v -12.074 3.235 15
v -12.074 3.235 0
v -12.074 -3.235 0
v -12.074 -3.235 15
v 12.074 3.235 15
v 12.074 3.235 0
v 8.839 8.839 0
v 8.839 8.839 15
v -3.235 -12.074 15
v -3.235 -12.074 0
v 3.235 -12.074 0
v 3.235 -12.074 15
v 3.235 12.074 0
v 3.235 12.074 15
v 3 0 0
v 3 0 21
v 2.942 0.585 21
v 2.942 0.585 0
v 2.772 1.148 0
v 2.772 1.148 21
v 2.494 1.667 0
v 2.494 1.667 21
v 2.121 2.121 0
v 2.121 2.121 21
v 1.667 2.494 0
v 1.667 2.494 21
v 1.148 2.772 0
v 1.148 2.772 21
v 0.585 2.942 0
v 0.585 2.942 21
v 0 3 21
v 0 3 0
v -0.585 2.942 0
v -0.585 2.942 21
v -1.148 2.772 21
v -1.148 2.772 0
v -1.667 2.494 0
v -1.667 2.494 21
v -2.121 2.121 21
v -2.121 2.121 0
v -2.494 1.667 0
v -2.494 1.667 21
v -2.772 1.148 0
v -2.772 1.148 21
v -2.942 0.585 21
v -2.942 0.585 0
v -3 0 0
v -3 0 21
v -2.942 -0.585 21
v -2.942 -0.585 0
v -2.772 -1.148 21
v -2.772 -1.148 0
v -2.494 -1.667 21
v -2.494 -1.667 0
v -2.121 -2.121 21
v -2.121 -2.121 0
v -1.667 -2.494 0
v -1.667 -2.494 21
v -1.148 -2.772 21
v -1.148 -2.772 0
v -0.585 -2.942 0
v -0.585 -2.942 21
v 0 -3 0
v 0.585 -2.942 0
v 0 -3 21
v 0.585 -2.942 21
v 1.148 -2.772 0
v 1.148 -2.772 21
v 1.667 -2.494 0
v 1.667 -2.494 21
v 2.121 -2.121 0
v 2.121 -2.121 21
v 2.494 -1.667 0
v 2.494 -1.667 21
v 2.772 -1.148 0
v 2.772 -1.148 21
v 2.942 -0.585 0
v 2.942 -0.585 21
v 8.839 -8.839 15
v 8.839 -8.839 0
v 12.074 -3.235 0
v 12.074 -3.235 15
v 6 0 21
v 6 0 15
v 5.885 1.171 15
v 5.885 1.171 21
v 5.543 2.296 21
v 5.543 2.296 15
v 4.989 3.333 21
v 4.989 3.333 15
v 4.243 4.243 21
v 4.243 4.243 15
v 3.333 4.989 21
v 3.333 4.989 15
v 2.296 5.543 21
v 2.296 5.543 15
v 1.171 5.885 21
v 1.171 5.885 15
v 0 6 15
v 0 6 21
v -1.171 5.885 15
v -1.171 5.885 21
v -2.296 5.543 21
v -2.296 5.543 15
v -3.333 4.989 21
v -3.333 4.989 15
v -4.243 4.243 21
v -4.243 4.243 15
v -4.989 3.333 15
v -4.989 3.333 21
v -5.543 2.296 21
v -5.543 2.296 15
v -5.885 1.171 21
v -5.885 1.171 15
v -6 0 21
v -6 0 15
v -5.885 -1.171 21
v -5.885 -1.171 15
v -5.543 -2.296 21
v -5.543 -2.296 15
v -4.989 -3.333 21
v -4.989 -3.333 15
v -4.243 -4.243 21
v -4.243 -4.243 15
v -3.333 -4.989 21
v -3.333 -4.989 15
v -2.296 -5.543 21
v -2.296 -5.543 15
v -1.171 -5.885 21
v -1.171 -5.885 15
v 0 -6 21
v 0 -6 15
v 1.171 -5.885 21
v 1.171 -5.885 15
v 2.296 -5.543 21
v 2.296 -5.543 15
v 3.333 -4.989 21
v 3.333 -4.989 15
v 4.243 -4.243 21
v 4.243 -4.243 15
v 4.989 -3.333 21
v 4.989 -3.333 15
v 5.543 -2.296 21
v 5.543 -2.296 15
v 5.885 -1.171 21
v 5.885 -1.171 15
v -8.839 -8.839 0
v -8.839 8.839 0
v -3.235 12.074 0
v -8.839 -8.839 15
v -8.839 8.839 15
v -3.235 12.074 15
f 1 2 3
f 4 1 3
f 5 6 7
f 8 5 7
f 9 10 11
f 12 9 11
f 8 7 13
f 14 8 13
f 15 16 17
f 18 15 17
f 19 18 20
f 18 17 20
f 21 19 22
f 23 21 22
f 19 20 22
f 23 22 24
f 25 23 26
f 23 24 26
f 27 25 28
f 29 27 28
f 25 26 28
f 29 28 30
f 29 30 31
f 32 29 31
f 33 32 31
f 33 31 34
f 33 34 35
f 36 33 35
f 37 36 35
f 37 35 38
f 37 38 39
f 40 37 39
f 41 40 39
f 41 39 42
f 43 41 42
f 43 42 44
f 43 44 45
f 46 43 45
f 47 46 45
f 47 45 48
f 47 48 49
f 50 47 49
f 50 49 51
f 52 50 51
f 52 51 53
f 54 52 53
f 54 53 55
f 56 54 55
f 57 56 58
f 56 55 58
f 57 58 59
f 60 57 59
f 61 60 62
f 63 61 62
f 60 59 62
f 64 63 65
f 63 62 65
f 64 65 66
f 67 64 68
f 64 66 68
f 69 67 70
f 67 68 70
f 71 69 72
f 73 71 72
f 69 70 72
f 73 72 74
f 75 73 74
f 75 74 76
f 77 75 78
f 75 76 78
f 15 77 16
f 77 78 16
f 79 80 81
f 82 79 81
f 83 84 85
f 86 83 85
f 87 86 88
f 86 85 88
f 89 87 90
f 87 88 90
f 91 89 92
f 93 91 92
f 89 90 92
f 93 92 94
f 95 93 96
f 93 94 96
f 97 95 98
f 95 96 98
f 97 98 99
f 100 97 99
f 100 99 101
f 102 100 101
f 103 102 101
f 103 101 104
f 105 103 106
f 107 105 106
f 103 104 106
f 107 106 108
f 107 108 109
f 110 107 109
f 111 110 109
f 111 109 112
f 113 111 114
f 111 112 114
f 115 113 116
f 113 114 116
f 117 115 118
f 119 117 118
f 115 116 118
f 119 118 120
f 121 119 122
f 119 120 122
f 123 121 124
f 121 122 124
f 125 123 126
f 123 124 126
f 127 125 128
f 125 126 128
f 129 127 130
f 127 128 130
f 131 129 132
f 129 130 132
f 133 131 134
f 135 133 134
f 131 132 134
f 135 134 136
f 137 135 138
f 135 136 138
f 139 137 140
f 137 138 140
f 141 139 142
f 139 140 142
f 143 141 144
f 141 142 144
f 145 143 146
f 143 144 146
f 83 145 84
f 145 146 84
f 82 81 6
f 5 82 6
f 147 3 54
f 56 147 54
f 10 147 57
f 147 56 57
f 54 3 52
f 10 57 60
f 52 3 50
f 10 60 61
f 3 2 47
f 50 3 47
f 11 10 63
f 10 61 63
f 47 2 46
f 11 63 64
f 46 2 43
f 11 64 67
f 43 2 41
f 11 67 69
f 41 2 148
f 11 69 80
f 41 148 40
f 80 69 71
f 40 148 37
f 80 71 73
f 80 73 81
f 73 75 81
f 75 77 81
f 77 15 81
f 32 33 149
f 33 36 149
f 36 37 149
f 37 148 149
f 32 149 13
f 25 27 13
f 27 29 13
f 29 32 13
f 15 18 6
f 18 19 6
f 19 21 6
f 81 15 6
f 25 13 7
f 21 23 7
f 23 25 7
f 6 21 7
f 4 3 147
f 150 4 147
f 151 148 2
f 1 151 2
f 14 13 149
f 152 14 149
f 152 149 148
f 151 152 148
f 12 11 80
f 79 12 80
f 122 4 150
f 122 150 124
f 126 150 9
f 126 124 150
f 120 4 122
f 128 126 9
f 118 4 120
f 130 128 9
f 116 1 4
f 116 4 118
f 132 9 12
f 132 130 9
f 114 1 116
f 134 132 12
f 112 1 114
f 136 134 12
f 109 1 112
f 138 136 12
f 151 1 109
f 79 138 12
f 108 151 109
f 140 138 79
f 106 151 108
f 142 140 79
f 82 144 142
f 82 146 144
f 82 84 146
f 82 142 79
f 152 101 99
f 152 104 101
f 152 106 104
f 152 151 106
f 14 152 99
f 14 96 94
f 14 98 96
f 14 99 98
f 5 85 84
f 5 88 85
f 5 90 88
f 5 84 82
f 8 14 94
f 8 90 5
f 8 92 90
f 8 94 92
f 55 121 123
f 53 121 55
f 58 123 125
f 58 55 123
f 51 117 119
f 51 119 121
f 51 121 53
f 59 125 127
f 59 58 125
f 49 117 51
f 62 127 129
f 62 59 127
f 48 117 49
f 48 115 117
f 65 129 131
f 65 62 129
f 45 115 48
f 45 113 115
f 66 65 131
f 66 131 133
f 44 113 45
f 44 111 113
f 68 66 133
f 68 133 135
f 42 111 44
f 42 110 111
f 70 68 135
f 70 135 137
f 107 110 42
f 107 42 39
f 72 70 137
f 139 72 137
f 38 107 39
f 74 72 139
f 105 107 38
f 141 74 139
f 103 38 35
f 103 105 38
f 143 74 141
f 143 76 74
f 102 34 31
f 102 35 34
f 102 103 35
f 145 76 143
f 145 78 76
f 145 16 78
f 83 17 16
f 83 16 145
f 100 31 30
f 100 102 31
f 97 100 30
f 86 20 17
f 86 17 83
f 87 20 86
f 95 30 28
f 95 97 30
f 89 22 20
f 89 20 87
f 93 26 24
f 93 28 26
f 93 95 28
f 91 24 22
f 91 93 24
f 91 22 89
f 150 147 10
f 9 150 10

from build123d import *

# Parameters (mm, degrees)
PAD_DEPTH    = 15
SKETCH001_R  = 6
PAD001_DEPTH = 6
SKETCH002_R  = 3
POCKET_DEPTH = 21.001


with BuildPart() as part:
    # Sketch → Pad (new body)
    with BuildSketch(Plane.XY):
        Polygon((8.838835, 8.838835), (3.235238, 12.074073), (-3.235238, 12.074073), (-8.838835, 8.838835), (-12.074073, 3.235238), (-12.074073, -3.235238), (-8.838835, -8.838835), (-3.235238, -12.074073), (3.235238, -12.074073), (8.838835, -8.838835), (12.074073, -3.235238), (12.074073, 3.235238), align=None)
    extrude(amount=PAD_DEPTH)

    # Sketch001 (on Face14 of Pad) → Pad001 (join)
    with BuildSketch(Plane.XY.offset(15)):
        Circle(SKETCH001_R)
    extrude(amount=PAD001_DEPTH)

    # Sketch002 (on Face16 of Pad001) → Pocket (cut, through all)
    with BuildSketch(Plane.XY.offset(21)):
        Circle(SKETCH002_R)
    extrude(amount=-POCKET_DEPTH, mode=Mode.SUBTRACT)


solid = part.part
